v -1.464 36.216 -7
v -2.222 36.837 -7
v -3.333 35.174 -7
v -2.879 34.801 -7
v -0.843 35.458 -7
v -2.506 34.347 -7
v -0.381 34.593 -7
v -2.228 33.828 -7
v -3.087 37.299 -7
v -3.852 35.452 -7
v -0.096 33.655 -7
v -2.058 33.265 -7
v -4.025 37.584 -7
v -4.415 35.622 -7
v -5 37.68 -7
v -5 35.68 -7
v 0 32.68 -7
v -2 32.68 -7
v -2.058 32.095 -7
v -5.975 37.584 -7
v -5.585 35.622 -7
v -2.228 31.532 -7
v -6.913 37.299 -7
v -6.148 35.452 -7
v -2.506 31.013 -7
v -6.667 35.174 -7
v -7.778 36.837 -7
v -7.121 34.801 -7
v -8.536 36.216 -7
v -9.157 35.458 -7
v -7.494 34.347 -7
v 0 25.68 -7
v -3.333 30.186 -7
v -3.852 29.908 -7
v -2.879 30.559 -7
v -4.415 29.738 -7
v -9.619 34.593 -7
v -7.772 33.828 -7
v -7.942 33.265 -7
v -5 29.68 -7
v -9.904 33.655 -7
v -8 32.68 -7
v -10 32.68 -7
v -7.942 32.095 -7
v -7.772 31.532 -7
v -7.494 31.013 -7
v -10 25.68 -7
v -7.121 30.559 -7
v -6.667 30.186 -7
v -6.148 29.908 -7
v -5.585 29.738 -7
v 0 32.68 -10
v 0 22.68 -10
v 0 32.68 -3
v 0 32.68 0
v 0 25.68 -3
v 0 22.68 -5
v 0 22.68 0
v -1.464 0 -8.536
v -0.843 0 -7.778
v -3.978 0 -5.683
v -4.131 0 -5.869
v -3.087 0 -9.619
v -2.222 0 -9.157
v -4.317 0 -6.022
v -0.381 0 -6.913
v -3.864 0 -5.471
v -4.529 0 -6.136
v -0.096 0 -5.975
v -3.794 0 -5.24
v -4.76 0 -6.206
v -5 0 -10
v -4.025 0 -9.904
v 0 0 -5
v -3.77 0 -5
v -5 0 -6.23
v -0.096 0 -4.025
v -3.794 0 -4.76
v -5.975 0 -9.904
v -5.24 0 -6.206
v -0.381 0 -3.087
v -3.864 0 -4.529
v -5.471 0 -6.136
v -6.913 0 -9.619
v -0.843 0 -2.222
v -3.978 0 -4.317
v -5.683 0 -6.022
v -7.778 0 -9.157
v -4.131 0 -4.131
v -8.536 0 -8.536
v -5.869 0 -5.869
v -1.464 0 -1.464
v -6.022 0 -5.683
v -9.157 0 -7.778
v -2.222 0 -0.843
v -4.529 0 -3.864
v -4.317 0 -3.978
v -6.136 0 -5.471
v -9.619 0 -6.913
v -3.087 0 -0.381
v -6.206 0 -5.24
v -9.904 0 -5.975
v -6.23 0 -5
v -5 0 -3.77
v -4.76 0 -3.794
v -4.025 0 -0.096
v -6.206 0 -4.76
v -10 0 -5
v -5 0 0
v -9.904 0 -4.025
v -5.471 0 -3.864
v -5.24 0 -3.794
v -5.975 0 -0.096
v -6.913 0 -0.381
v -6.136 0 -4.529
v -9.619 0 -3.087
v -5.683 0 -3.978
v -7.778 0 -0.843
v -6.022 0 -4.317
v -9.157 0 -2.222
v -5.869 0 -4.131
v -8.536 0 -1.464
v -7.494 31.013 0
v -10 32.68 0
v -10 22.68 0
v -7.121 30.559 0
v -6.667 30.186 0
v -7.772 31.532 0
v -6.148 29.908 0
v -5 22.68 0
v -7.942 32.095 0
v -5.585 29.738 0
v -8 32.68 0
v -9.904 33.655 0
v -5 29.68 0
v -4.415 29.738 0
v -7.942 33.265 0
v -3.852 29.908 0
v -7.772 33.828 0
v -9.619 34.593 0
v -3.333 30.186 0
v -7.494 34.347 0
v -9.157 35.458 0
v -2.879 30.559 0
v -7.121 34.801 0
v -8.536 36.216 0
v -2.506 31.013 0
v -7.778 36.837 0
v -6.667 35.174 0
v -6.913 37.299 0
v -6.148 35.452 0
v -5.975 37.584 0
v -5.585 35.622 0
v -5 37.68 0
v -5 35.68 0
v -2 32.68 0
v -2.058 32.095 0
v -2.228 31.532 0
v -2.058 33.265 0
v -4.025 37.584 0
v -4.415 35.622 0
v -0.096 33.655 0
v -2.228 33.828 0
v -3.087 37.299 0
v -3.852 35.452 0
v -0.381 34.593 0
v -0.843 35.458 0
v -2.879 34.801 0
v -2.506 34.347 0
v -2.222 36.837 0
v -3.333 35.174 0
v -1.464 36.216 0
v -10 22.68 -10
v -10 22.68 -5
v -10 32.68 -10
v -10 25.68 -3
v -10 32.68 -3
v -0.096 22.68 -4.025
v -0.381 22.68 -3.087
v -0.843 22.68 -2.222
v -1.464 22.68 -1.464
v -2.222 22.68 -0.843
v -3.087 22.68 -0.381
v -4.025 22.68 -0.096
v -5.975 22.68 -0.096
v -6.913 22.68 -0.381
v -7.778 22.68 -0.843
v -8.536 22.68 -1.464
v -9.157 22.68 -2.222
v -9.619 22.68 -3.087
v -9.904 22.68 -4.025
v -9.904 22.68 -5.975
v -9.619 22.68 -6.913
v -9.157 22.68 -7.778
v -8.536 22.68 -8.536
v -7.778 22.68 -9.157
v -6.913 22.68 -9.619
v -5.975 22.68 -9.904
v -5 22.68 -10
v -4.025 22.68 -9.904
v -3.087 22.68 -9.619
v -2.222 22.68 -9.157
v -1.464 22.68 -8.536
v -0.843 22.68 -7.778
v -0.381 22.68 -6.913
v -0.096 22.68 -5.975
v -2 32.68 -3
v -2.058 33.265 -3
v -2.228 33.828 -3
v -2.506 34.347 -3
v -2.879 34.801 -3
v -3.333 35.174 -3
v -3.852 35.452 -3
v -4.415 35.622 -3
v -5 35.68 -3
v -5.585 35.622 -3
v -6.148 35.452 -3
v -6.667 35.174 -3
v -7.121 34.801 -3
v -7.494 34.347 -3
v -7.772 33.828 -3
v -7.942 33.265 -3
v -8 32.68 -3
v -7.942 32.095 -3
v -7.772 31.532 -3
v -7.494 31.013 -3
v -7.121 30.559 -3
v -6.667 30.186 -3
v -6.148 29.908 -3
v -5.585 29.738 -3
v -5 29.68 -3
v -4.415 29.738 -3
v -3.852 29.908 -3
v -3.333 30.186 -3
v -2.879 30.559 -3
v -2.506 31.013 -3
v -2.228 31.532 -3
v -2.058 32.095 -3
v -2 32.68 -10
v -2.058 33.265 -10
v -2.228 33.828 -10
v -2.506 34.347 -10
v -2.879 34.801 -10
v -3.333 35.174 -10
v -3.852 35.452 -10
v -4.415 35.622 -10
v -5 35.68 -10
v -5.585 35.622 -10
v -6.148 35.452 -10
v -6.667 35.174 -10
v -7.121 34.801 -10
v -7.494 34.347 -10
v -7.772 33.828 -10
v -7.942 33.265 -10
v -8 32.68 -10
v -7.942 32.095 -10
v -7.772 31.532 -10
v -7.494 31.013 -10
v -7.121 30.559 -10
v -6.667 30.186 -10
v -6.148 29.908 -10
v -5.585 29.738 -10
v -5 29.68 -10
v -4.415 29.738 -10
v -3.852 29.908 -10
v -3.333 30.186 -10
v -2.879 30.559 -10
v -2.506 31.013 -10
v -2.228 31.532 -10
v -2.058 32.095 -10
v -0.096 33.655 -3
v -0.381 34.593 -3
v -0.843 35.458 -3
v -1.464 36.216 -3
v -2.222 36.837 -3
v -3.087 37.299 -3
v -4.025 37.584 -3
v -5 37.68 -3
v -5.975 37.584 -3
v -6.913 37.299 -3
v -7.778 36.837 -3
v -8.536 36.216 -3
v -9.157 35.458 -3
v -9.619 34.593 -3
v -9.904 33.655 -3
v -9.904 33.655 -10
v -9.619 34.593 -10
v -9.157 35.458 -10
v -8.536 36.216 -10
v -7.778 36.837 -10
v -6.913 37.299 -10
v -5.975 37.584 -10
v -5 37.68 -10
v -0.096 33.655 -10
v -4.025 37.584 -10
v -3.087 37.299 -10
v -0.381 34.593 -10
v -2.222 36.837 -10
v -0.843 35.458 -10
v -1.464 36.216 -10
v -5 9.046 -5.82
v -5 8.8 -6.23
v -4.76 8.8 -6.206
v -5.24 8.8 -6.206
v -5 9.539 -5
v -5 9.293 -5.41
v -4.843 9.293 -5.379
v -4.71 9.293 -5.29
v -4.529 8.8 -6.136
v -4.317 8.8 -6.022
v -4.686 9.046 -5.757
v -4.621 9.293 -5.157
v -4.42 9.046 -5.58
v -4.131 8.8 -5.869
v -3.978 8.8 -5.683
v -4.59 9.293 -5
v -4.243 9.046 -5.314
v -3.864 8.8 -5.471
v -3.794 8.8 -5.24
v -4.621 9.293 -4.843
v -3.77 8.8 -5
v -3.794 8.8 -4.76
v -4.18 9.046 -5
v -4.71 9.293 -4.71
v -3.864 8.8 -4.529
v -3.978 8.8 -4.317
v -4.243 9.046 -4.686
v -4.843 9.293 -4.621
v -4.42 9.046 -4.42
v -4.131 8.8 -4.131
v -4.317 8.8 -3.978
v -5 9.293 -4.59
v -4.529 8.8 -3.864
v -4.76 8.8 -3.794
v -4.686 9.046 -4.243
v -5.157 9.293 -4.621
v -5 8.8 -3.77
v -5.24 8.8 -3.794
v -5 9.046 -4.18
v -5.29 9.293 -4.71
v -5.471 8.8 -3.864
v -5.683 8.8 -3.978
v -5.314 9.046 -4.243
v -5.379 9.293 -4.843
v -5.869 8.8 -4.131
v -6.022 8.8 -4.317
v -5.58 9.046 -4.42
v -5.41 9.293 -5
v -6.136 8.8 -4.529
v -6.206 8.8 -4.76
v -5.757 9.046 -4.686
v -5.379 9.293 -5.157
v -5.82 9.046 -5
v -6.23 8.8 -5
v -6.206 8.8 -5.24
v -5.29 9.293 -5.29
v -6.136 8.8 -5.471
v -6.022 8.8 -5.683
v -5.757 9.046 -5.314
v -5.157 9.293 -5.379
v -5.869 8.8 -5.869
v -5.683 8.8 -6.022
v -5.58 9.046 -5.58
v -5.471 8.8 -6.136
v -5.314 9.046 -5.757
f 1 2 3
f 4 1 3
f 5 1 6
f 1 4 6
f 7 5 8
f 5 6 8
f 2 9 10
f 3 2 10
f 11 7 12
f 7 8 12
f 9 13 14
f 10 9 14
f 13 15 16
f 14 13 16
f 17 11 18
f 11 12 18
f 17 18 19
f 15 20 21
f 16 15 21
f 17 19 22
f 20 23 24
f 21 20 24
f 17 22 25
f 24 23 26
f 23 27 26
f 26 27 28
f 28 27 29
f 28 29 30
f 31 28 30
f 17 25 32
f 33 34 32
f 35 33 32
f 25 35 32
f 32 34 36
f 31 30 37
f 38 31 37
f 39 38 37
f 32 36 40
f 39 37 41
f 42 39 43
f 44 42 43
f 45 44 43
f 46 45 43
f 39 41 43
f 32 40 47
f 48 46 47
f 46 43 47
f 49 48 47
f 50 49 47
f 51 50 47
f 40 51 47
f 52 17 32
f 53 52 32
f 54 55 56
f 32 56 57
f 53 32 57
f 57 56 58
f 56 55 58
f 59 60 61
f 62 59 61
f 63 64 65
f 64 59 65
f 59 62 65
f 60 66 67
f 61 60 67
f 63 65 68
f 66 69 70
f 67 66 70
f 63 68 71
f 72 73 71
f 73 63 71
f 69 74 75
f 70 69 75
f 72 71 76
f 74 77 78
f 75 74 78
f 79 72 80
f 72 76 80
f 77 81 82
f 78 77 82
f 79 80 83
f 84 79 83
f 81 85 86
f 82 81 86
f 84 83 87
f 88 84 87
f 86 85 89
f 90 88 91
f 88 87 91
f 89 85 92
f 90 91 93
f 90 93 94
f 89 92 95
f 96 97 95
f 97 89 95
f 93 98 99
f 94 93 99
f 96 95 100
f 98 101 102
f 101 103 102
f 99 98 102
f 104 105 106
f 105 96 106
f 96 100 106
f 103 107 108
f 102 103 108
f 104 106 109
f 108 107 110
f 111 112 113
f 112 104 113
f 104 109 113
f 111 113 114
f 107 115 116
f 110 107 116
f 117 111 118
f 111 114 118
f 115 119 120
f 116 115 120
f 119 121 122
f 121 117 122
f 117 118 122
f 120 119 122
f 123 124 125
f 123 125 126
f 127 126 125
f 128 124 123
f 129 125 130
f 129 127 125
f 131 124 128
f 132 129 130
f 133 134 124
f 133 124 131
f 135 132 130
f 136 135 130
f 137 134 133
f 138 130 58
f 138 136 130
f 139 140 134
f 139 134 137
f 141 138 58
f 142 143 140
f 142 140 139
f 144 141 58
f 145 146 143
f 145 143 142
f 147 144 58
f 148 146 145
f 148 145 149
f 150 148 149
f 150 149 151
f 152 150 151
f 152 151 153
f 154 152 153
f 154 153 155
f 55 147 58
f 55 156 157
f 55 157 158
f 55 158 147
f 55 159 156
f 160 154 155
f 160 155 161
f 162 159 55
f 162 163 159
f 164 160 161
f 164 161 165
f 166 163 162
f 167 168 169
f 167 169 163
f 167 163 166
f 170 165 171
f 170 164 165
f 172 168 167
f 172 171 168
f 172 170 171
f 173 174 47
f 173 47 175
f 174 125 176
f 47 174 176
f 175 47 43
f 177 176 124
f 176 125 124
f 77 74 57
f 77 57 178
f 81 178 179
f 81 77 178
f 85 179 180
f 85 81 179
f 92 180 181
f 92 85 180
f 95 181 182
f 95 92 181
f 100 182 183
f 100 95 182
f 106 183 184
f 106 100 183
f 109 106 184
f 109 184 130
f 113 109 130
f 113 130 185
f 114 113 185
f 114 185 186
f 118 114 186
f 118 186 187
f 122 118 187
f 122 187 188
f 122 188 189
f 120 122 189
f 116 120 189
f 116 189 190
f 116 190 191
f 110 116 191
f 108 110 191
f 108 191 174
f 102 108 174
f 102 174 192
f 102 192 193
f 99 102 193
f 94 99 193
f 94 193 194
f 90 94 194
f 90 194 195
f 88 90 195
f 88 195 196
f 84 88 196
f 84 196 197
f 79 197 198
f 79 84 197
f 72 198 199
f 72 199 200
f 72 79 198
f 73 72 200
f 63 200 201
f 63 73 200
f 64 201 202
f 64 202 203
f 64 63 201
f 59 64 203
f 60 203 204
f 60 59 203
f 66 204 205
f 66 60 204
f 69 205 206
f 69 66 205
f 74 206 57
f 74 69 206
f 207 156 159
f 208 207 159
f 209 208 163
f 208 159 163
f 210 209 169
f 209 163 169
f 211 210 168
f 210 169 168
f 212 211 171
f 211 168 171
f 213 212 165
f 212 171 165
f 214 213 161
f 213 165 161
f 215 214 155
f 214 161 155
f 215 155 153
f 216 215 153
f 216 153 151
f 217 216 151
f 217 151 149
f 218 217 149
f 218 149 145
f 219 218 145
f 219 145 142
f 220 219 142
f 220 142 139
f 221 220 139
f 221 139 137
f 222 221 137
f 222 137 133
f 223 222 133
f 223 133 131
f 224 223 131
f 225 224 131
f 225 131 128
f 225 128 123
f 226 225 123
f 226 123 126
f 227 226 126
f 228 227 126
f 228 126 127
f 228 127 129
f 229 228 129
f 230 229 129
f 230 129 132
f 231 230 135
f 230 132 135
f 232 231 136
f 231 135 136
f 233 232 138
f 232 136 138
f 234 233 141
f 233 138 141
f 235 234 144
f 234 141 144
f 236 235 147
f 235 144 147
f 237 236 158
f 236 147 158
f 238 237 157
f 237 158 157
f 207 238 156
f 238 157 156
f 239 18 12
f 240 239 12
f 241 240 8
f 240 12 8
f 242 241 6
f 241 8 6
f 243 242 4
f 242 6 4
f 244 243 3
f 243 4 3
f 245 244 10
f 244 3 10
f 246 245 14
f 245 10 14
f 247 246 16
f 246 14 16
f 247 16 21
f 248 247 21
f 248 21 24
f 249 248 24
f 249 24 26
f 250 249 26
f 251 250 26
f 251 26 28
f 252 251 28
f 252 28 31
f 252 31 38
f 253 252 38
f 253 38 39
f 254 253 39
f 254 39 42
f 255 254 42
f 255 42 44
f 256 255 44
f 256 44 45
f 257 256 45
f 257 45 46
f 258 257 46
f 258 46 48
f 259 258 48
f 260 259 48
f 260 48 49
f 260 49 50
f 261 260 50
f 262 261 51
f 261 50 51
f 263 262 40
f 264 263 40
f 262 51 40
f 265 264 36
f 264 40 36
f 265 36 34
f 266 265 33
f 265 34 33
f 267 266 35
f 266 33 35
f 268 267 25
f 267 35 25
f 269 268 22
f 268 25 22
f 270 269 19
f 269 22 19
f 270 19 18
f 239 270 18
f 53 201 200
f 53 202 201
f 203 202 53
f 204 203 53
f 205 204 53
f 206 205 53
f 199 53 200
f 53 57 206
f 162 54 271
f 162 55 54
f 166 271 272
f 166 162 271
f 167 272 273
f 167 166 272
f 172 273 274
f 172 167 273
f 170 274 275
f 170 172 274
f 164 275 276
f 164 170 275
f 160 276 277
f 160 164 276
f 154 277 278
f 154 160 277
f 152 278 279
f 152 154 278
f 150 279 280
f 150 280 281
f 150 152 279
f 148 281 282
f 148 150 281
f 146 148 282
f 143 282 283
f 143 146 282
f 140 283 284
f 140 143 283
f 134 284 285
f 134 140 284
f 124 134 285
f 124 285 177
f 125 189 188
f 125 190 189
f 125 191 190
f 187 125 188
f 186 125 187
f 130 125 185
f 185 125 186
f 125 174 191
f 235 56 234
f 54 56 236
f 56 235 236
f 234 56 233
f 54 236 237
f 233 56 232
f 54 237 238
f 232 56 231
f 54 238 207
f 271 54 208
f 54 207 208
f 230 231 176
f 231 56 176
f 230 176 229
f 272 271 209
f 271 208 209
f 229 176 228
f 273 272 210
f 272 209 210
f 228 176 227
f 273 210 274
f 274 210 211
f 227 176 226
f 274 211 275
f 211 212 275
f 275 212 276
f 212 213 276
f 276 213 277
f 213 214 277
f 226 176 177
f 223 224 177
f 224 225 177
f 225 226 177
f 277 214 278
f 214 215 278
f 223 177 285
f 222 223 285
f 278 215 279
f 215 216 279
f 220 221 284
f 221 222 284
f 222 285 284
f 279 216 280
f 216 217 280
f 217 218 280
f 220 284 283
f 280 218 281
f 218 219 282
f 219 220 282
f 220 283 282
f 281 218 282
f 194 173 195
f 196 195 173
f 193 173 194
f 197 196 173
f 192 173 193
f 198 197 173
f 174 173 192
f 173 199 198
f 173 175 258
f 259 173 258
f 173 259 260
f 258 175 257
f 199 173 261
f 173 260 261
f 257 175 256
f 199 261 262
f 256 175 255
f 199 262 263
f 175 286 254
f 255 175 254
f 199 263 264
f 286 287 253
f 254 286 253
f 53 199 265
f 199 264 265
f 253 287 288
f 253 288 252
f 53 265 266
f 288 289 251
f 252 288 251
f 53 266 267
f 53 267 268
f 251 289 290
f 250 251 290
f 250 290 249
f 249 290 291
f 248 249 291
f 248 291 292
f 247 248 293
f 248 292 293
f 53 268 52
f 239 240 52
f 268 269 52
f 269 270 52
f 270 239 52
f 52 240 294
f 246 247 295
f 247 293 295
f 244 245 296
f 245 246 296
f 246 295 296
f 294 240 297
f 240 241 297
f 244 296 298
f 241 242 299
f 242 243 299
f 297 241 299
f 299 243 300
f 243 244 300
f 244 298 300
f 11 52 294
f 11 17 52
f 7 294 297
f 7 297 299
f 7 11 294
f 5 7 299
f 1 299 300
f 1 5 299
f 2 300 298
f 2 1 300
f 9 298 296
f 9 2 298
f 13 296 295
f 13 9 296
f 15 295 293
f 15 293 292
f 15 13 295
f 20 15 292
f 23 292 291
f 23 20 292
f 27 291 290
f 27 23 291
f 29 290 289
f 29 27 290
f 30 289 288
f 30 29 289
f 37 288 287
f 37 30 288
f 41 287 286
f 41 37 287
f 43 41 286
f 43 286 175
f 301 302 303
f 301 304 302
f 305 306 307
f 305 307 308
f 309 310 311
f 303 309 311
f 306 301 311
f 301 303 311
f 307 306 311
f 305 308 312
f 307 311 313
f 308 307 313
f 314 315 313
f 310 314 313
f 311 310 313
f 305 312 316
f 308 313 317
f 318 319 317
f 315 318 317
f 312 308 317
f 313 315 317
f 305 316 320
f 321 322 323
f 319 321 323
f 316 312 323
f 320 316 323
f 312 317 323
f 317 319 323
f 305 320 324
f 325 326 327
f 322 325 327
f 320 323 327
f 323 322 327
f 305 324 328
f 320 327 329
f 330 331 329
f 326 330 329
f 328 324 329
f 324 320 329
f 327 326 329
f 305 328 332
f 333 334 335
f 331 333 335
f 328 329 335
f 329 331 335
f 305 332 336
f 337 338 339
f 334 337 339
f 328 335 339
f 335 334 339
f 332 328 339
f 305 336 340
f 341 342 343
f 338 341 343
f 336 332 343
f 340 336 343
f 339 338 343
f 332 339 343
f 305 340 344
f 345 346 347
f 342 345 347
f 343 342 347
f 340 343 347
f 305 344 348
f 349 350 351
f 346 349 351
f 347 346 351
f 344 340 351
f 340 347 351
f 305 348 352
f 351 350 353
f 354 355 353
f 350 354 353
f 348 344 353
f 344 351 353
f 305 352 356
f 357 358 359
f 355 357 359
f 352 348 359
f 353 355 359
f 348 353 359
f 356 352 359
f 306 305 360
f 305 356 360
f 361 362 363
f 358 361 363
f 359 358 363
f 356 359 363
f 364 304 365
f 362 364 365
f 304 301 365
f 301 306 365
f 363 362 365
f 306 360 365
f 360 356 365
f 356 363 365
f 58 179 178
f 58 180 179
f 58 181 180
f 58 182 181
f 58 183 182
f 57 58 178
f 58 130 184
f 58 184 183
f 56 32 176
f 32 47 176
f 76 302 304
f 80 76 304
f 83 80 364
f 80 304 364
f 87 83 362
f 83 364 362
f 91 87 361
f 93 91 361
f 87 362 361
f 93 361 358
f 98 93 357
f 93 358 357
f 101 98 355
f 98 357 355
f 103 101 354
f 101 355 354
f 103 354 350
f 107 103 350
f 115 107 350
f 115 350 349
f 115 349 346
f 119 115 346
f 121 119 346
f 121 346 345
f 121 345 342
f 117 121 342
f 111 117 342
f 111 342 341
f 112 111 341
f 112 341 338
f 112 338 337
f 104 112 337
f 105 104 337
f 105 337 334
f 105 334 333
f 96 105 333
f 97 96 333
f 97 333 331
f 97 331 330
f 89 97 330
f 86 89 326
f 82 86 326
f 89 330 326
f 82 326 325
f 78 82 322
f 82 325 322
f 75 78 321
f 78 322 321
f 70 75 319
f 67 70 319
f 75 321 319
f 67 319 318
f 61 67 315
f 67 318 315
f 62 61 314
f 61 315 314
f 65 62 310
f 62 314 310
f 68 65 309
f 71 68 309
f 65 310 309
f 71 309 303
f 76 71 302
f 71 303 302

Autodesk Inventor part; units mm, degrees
ref_plane "YZ Plane" through (0, 0, 0) normal (1, 0, 0) x (0, 1, 0)
ref_plane "XZ Plane" through (0, 0, 0) normal (0, 1, 0) x (-1, 0, 0)
ref_plane "XY Plane" through (0, 0, 0) normal (0, 0, 1) x (1, 0, 0)
sketch "Szkic1" plane through (0, 0, 0) normal (0, 0, 1) x (1, 0, 0)
  line L0 (0, 0) -> (-10, 0)
  line L1 (-10, 0) -> (-10, 32.68)
  line L2 (-10, 32.68) -> (0, 32.68)
  line L3 (0, 32.68) -> (0, 0)
  arc A0 (0, 32.68) -> (-10, 32.68) centre (-5, 32.68) ccw
  circle A1 centre (-5, 32.68) radius 3
  dimension "d2" = 10
  dimension "d3" = 32.68
  dimension "d4" = 6
extrude "Wyciągnięcie proste1" add sketch "Szkic1" against normal blind 10 contours L0 L1 L2 A1 L3 | L2 A1 A0
sketch "Szkic2" plane through (-10, 0, 0) normal (-1, 0, 0) x (0, 0, 1)
  line L0 (-10, 29.68) -> (0, 29.68) projected
  line L1 (-13.2063, 25.68) -> (3.6302, 25.68)
  line L2 (0, 32.68) -> (-10, 32.68) projected
  line L3 (-5, 32.68) -> (-5, 38.3797)
  line L4 (-7, 25.68) -> (-3, 25.68)
  line L5 (-3, 25.68) -> (-3, 38.3797)
  line L6 (-3, 38.3797) -> (-7, 38.3797)
  line L7 (-7, 38.3797) -> (-7, 25.68)
  point P0 (0, 0)
  dimension "d7" = 7
  dimension "d8" = 4
extrude "Wyciągnięcie proste2" cut sketch "Szkic2" against normal blind 10
sketch "Szkic3" plane through (-10, 0, 0) normal (0, -1, 0) x (1, 0, 0)
  line L0 (0, -10) -> (10, -10) projected
  line L1 (5, -10) -> (5, 0)
  line L2 (0, 0) -> (10, 0) projected
  line L3 (10, 0) -> (10, -10) projected
  line L4 (10, -5) -> (0, -5)
  line L5 (0, 0) -> (0, -10) projected
  point P0 (5, -5)
hole "Otwór1" at (-5, 0, -5) direction (0, 1, 0) diameter 2.459 depth 8.8 tip angle 118 thread size "M3x0.5" class "6H" standard "ISO Metric profile"
sketch "Szkic4" plane through (-10, 0, 0) normal (0, -1, 0) x (1, 0, 0)
  line L0 (10, 0) -> (10, -10) projected
  line L1 (0, 0) -> (0, -10) projected
  line L2 (10, -10) -> (0, -10)
  line L3 (0, -10) -> (0, 0)
  line L4 (0, 0) -> (10, 0)
  line L5 (10, 0) -> (10, -10)
  circle A0 centre (5, -5) radius 1.2295 projected
  circle A1 centre (5, -5) radius 5
  point P0 (0, -5)
  point P1 (5, 0)
  point P2 (10, -5)
  point P3 (5, -10)
extrude "Wyciągnięcie proste3" cut sketch "Szkic4" against normal blind 22.68 contours L0 A1 L4 | L0 L2 A1 | A1 L1 L4 | L2 L1 A1
properties part number "Część L5" material "Stal nierdzewna 440C"
